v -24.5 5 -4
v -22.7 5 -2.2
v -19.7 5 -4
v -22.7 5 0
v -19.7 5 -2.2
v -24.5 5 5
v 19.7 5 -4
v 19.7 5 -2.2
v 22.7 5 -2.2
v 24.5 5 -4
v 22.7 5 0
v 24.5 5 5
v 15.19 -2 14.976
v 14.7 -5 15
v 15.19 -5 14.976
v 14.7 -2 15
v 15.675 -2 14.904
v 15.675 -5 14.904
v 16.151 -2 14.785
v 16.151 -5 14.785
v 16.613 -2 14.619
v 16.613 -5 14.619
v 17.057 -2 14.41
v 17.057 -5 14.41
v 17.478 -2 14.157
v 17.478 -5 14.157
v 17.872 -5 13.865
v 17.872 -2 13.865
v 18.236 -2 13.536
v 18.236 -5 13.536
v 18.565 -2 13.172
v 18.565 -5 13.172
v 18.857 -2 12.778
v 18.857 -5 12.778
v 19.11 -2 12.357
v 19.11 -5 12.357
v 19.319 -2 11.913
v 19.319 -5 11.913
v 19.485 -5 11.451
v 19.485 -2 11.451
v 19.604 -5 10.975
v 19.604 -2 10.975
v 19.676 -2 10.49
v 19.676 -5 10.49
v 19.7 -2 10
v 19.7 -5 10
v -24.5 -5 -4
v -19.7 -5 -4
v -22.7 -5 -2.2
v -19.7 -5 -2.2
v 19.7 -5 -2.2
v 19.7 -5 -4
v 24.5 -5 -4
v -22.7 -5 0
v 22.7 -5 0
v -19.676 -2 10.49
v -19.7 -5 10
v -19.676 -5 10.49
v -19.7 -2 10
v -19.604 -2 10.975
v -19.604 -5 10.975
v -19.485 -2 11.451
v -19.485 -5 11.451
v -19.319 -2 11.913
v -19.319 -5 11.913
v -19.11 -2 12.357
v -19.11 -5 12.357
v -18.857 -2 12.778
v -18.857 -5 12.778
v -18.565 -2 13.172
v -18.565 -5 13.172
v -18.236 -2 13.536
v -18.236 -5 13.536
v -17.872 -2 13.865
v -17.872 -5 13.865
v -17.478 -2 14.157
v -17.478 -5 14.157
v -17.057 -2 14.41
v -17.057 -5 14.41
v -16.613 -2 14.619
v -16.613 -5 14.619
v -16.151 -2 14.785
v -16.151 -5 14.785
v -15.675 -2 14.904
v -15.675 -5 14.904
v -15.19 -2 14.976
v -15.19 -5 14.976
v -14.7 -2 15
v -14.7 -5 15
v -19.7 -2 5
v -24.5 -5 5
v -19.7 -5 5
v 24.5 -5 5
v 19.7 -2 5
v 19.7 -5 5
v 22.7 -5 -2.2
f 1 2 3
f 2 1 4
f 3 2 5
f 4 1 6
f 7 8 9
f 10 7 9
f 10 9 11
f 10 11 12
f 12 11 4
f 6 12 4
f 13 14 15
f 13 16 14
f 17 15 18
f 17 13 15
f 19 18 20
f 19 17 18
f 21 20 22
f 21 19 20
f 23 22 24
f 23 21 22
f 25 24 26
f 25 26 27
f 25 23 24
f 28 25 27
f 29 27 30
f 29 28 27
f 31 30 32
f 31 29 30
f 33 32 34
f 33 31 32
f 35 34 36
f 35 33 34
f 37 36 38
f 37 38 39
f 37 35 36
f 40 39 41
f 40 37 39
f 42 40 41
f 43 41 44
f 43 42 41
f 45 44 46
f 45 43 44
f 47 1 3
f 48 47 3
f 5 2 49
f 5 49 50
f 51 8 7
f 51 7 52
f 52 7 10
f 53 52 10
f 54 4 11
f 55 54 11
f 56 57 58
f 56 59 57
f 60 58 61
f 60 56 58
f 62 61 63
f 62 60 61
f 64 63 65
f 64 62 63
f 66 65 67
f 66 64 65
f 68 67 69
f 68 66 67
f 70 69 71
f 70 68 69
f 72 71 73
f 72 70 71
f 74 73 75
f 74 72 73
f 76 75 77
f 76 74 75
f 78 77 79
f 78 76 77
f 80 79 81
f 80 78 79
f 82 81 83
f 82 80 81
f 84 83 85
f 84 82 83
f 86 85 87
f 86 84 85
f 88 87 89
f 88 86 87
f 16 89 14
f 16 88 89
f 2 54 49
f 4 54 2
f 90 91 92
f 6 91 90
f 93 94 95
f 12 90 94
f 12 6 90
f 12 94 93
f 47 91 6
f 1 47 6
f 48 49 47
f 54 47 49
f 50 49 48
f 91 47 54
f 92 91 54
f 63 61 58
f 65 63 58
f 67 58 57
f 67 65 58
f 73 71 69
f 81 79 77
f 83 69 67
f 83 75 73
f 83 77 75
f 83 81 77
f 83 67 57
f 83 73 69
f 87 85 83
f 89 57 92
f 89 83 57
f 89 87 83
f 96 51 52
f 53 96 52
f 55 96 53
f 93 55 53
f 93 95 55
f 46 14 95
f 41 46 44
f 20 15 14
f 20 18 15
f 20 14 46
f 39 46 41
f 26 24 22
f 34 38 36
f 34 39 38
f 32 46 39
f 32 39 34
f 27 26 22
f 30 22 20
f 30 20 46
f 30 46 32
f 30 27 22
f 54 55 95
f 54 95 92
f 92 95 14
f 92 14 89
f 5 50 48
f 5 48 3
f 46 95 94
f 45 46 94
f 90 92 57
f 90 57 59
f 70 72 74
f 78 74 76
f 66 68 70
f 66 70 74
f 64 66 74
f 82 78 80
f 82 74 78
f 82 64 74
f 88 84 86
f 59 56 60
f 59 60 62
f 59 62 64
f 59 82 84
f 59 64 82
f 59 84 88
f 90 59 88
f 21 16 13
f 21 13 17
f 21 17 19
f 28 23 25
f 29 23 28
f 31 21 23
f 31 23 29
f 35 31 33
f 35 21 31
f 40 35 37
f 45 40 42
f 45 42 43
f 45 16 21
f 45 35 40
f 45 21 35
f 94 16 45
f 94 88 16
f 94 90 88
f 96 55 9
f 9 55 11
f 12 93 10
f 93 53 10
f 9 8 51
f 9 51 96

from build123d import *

# Parameters (mm, degrees)
F0_W     = 1.8
F0_H     = 10
F0_W_2   = 39.4
F0_H_2   = 7
F0_H_3   = 3
F1_DEPTH = 5
F2_DEPTH = 2
F3_START = -2.2
F3_DEPTH = 1.8
F4_START = -2
F4_DEPTH = 2
F5_DEPTH = 15
F6_R     = 5


with BuildPart() as f1:
    # F0 (on Top) → F1 (new body)
    with BuildSketch(Plane.XY):
        with Locations((-23.6, 0)):
            Rectangle(F0_W, F0_H)
        Polygon((-19.7, -2), (-19.7, 5), (-22.7, 5), (-22.7, -5), (-19.7, -5), align=None)
        with Locations((0, 1.5)):
            Rectangle(F0_W_2, F0_H_2)
        Polygon((22.7, -5), (22.7, 5), (19.7, 5), (19.7, -2), (19.7, -5), align=None)
        with Locations((23.6, 0)):
            Rectangle(F0_W, F0_H)
        with Locations((0, -3.5)):
            Rectangle(F0_W_2, F0_H_3)
    extrude(amount=F1_DEPTH)

    # F0 (on Top) → F2 (join)
    with BuildSketch(Plane.XY):
        with Locations((-23.6, 0)):
            Rectangle(F0_W, F0_H)
        with Locations((23.6, 0)):
            Rectangle(F0_W, F0_H)
    extrude(amount=-F2_DEPTH)



with BuildPart() as f3:
    # F0 (on Top) → F3 (new body)
    with BuildSketch(Plane.XY.offset(F3_START)):
        Polygon((-19.7, -2), (-19.7, 5), (-22.7, 5), (-22.7, -5), (-19.7, -5), align=None)
    extrude(amount=-F3_DEPTH)


with BuildPart() as f3b:
    # F0 (on Top) → F3, piece 2 (new body)
    with BuildSketch(Plane.XY.offset(F3_START)):
        Polygon((22.7, -5), (22.7, 5), (19.7, 5), (19.7, -2), (19.7, -5), align=None)
    extrude(amount=-F3_DEPTH)


with BuildPart() as f1_1:
    add(f1.part)

    add(f3.part)  # F4 merges F3

    add(f3b.part)  # F4 merges F3b
    # F0 (on Top) → F4 (join)
    with BuildSketch(Plane.XY.offset(F4_START)):
        with Locations((-23.6, 0)):
            Rectangle(F0_W, F0_H)
        with Locations((23.6, 0)):
            Rectangle(F0_W, F0_H)
    extrude(amount=-F4_DEPTH)

    # F0 (on Top) → F5 (join)
    with BuildSketch(Plane.XY):
        with Locations((0, -3.5)):
            Rectangle(F0_W_2, F0_H_3)
    extrude(amount=F5_DEPTH)

    # F6
    f6_edges = [f1_1.edges().sort_by_distance(p)[0] for p in [
        (-19.7, -3.5, 15),
        (19.7, -3.5, 15),
    ]]
    fillet(f6_edges, radius=F6_R)


solid = f1_1.part
